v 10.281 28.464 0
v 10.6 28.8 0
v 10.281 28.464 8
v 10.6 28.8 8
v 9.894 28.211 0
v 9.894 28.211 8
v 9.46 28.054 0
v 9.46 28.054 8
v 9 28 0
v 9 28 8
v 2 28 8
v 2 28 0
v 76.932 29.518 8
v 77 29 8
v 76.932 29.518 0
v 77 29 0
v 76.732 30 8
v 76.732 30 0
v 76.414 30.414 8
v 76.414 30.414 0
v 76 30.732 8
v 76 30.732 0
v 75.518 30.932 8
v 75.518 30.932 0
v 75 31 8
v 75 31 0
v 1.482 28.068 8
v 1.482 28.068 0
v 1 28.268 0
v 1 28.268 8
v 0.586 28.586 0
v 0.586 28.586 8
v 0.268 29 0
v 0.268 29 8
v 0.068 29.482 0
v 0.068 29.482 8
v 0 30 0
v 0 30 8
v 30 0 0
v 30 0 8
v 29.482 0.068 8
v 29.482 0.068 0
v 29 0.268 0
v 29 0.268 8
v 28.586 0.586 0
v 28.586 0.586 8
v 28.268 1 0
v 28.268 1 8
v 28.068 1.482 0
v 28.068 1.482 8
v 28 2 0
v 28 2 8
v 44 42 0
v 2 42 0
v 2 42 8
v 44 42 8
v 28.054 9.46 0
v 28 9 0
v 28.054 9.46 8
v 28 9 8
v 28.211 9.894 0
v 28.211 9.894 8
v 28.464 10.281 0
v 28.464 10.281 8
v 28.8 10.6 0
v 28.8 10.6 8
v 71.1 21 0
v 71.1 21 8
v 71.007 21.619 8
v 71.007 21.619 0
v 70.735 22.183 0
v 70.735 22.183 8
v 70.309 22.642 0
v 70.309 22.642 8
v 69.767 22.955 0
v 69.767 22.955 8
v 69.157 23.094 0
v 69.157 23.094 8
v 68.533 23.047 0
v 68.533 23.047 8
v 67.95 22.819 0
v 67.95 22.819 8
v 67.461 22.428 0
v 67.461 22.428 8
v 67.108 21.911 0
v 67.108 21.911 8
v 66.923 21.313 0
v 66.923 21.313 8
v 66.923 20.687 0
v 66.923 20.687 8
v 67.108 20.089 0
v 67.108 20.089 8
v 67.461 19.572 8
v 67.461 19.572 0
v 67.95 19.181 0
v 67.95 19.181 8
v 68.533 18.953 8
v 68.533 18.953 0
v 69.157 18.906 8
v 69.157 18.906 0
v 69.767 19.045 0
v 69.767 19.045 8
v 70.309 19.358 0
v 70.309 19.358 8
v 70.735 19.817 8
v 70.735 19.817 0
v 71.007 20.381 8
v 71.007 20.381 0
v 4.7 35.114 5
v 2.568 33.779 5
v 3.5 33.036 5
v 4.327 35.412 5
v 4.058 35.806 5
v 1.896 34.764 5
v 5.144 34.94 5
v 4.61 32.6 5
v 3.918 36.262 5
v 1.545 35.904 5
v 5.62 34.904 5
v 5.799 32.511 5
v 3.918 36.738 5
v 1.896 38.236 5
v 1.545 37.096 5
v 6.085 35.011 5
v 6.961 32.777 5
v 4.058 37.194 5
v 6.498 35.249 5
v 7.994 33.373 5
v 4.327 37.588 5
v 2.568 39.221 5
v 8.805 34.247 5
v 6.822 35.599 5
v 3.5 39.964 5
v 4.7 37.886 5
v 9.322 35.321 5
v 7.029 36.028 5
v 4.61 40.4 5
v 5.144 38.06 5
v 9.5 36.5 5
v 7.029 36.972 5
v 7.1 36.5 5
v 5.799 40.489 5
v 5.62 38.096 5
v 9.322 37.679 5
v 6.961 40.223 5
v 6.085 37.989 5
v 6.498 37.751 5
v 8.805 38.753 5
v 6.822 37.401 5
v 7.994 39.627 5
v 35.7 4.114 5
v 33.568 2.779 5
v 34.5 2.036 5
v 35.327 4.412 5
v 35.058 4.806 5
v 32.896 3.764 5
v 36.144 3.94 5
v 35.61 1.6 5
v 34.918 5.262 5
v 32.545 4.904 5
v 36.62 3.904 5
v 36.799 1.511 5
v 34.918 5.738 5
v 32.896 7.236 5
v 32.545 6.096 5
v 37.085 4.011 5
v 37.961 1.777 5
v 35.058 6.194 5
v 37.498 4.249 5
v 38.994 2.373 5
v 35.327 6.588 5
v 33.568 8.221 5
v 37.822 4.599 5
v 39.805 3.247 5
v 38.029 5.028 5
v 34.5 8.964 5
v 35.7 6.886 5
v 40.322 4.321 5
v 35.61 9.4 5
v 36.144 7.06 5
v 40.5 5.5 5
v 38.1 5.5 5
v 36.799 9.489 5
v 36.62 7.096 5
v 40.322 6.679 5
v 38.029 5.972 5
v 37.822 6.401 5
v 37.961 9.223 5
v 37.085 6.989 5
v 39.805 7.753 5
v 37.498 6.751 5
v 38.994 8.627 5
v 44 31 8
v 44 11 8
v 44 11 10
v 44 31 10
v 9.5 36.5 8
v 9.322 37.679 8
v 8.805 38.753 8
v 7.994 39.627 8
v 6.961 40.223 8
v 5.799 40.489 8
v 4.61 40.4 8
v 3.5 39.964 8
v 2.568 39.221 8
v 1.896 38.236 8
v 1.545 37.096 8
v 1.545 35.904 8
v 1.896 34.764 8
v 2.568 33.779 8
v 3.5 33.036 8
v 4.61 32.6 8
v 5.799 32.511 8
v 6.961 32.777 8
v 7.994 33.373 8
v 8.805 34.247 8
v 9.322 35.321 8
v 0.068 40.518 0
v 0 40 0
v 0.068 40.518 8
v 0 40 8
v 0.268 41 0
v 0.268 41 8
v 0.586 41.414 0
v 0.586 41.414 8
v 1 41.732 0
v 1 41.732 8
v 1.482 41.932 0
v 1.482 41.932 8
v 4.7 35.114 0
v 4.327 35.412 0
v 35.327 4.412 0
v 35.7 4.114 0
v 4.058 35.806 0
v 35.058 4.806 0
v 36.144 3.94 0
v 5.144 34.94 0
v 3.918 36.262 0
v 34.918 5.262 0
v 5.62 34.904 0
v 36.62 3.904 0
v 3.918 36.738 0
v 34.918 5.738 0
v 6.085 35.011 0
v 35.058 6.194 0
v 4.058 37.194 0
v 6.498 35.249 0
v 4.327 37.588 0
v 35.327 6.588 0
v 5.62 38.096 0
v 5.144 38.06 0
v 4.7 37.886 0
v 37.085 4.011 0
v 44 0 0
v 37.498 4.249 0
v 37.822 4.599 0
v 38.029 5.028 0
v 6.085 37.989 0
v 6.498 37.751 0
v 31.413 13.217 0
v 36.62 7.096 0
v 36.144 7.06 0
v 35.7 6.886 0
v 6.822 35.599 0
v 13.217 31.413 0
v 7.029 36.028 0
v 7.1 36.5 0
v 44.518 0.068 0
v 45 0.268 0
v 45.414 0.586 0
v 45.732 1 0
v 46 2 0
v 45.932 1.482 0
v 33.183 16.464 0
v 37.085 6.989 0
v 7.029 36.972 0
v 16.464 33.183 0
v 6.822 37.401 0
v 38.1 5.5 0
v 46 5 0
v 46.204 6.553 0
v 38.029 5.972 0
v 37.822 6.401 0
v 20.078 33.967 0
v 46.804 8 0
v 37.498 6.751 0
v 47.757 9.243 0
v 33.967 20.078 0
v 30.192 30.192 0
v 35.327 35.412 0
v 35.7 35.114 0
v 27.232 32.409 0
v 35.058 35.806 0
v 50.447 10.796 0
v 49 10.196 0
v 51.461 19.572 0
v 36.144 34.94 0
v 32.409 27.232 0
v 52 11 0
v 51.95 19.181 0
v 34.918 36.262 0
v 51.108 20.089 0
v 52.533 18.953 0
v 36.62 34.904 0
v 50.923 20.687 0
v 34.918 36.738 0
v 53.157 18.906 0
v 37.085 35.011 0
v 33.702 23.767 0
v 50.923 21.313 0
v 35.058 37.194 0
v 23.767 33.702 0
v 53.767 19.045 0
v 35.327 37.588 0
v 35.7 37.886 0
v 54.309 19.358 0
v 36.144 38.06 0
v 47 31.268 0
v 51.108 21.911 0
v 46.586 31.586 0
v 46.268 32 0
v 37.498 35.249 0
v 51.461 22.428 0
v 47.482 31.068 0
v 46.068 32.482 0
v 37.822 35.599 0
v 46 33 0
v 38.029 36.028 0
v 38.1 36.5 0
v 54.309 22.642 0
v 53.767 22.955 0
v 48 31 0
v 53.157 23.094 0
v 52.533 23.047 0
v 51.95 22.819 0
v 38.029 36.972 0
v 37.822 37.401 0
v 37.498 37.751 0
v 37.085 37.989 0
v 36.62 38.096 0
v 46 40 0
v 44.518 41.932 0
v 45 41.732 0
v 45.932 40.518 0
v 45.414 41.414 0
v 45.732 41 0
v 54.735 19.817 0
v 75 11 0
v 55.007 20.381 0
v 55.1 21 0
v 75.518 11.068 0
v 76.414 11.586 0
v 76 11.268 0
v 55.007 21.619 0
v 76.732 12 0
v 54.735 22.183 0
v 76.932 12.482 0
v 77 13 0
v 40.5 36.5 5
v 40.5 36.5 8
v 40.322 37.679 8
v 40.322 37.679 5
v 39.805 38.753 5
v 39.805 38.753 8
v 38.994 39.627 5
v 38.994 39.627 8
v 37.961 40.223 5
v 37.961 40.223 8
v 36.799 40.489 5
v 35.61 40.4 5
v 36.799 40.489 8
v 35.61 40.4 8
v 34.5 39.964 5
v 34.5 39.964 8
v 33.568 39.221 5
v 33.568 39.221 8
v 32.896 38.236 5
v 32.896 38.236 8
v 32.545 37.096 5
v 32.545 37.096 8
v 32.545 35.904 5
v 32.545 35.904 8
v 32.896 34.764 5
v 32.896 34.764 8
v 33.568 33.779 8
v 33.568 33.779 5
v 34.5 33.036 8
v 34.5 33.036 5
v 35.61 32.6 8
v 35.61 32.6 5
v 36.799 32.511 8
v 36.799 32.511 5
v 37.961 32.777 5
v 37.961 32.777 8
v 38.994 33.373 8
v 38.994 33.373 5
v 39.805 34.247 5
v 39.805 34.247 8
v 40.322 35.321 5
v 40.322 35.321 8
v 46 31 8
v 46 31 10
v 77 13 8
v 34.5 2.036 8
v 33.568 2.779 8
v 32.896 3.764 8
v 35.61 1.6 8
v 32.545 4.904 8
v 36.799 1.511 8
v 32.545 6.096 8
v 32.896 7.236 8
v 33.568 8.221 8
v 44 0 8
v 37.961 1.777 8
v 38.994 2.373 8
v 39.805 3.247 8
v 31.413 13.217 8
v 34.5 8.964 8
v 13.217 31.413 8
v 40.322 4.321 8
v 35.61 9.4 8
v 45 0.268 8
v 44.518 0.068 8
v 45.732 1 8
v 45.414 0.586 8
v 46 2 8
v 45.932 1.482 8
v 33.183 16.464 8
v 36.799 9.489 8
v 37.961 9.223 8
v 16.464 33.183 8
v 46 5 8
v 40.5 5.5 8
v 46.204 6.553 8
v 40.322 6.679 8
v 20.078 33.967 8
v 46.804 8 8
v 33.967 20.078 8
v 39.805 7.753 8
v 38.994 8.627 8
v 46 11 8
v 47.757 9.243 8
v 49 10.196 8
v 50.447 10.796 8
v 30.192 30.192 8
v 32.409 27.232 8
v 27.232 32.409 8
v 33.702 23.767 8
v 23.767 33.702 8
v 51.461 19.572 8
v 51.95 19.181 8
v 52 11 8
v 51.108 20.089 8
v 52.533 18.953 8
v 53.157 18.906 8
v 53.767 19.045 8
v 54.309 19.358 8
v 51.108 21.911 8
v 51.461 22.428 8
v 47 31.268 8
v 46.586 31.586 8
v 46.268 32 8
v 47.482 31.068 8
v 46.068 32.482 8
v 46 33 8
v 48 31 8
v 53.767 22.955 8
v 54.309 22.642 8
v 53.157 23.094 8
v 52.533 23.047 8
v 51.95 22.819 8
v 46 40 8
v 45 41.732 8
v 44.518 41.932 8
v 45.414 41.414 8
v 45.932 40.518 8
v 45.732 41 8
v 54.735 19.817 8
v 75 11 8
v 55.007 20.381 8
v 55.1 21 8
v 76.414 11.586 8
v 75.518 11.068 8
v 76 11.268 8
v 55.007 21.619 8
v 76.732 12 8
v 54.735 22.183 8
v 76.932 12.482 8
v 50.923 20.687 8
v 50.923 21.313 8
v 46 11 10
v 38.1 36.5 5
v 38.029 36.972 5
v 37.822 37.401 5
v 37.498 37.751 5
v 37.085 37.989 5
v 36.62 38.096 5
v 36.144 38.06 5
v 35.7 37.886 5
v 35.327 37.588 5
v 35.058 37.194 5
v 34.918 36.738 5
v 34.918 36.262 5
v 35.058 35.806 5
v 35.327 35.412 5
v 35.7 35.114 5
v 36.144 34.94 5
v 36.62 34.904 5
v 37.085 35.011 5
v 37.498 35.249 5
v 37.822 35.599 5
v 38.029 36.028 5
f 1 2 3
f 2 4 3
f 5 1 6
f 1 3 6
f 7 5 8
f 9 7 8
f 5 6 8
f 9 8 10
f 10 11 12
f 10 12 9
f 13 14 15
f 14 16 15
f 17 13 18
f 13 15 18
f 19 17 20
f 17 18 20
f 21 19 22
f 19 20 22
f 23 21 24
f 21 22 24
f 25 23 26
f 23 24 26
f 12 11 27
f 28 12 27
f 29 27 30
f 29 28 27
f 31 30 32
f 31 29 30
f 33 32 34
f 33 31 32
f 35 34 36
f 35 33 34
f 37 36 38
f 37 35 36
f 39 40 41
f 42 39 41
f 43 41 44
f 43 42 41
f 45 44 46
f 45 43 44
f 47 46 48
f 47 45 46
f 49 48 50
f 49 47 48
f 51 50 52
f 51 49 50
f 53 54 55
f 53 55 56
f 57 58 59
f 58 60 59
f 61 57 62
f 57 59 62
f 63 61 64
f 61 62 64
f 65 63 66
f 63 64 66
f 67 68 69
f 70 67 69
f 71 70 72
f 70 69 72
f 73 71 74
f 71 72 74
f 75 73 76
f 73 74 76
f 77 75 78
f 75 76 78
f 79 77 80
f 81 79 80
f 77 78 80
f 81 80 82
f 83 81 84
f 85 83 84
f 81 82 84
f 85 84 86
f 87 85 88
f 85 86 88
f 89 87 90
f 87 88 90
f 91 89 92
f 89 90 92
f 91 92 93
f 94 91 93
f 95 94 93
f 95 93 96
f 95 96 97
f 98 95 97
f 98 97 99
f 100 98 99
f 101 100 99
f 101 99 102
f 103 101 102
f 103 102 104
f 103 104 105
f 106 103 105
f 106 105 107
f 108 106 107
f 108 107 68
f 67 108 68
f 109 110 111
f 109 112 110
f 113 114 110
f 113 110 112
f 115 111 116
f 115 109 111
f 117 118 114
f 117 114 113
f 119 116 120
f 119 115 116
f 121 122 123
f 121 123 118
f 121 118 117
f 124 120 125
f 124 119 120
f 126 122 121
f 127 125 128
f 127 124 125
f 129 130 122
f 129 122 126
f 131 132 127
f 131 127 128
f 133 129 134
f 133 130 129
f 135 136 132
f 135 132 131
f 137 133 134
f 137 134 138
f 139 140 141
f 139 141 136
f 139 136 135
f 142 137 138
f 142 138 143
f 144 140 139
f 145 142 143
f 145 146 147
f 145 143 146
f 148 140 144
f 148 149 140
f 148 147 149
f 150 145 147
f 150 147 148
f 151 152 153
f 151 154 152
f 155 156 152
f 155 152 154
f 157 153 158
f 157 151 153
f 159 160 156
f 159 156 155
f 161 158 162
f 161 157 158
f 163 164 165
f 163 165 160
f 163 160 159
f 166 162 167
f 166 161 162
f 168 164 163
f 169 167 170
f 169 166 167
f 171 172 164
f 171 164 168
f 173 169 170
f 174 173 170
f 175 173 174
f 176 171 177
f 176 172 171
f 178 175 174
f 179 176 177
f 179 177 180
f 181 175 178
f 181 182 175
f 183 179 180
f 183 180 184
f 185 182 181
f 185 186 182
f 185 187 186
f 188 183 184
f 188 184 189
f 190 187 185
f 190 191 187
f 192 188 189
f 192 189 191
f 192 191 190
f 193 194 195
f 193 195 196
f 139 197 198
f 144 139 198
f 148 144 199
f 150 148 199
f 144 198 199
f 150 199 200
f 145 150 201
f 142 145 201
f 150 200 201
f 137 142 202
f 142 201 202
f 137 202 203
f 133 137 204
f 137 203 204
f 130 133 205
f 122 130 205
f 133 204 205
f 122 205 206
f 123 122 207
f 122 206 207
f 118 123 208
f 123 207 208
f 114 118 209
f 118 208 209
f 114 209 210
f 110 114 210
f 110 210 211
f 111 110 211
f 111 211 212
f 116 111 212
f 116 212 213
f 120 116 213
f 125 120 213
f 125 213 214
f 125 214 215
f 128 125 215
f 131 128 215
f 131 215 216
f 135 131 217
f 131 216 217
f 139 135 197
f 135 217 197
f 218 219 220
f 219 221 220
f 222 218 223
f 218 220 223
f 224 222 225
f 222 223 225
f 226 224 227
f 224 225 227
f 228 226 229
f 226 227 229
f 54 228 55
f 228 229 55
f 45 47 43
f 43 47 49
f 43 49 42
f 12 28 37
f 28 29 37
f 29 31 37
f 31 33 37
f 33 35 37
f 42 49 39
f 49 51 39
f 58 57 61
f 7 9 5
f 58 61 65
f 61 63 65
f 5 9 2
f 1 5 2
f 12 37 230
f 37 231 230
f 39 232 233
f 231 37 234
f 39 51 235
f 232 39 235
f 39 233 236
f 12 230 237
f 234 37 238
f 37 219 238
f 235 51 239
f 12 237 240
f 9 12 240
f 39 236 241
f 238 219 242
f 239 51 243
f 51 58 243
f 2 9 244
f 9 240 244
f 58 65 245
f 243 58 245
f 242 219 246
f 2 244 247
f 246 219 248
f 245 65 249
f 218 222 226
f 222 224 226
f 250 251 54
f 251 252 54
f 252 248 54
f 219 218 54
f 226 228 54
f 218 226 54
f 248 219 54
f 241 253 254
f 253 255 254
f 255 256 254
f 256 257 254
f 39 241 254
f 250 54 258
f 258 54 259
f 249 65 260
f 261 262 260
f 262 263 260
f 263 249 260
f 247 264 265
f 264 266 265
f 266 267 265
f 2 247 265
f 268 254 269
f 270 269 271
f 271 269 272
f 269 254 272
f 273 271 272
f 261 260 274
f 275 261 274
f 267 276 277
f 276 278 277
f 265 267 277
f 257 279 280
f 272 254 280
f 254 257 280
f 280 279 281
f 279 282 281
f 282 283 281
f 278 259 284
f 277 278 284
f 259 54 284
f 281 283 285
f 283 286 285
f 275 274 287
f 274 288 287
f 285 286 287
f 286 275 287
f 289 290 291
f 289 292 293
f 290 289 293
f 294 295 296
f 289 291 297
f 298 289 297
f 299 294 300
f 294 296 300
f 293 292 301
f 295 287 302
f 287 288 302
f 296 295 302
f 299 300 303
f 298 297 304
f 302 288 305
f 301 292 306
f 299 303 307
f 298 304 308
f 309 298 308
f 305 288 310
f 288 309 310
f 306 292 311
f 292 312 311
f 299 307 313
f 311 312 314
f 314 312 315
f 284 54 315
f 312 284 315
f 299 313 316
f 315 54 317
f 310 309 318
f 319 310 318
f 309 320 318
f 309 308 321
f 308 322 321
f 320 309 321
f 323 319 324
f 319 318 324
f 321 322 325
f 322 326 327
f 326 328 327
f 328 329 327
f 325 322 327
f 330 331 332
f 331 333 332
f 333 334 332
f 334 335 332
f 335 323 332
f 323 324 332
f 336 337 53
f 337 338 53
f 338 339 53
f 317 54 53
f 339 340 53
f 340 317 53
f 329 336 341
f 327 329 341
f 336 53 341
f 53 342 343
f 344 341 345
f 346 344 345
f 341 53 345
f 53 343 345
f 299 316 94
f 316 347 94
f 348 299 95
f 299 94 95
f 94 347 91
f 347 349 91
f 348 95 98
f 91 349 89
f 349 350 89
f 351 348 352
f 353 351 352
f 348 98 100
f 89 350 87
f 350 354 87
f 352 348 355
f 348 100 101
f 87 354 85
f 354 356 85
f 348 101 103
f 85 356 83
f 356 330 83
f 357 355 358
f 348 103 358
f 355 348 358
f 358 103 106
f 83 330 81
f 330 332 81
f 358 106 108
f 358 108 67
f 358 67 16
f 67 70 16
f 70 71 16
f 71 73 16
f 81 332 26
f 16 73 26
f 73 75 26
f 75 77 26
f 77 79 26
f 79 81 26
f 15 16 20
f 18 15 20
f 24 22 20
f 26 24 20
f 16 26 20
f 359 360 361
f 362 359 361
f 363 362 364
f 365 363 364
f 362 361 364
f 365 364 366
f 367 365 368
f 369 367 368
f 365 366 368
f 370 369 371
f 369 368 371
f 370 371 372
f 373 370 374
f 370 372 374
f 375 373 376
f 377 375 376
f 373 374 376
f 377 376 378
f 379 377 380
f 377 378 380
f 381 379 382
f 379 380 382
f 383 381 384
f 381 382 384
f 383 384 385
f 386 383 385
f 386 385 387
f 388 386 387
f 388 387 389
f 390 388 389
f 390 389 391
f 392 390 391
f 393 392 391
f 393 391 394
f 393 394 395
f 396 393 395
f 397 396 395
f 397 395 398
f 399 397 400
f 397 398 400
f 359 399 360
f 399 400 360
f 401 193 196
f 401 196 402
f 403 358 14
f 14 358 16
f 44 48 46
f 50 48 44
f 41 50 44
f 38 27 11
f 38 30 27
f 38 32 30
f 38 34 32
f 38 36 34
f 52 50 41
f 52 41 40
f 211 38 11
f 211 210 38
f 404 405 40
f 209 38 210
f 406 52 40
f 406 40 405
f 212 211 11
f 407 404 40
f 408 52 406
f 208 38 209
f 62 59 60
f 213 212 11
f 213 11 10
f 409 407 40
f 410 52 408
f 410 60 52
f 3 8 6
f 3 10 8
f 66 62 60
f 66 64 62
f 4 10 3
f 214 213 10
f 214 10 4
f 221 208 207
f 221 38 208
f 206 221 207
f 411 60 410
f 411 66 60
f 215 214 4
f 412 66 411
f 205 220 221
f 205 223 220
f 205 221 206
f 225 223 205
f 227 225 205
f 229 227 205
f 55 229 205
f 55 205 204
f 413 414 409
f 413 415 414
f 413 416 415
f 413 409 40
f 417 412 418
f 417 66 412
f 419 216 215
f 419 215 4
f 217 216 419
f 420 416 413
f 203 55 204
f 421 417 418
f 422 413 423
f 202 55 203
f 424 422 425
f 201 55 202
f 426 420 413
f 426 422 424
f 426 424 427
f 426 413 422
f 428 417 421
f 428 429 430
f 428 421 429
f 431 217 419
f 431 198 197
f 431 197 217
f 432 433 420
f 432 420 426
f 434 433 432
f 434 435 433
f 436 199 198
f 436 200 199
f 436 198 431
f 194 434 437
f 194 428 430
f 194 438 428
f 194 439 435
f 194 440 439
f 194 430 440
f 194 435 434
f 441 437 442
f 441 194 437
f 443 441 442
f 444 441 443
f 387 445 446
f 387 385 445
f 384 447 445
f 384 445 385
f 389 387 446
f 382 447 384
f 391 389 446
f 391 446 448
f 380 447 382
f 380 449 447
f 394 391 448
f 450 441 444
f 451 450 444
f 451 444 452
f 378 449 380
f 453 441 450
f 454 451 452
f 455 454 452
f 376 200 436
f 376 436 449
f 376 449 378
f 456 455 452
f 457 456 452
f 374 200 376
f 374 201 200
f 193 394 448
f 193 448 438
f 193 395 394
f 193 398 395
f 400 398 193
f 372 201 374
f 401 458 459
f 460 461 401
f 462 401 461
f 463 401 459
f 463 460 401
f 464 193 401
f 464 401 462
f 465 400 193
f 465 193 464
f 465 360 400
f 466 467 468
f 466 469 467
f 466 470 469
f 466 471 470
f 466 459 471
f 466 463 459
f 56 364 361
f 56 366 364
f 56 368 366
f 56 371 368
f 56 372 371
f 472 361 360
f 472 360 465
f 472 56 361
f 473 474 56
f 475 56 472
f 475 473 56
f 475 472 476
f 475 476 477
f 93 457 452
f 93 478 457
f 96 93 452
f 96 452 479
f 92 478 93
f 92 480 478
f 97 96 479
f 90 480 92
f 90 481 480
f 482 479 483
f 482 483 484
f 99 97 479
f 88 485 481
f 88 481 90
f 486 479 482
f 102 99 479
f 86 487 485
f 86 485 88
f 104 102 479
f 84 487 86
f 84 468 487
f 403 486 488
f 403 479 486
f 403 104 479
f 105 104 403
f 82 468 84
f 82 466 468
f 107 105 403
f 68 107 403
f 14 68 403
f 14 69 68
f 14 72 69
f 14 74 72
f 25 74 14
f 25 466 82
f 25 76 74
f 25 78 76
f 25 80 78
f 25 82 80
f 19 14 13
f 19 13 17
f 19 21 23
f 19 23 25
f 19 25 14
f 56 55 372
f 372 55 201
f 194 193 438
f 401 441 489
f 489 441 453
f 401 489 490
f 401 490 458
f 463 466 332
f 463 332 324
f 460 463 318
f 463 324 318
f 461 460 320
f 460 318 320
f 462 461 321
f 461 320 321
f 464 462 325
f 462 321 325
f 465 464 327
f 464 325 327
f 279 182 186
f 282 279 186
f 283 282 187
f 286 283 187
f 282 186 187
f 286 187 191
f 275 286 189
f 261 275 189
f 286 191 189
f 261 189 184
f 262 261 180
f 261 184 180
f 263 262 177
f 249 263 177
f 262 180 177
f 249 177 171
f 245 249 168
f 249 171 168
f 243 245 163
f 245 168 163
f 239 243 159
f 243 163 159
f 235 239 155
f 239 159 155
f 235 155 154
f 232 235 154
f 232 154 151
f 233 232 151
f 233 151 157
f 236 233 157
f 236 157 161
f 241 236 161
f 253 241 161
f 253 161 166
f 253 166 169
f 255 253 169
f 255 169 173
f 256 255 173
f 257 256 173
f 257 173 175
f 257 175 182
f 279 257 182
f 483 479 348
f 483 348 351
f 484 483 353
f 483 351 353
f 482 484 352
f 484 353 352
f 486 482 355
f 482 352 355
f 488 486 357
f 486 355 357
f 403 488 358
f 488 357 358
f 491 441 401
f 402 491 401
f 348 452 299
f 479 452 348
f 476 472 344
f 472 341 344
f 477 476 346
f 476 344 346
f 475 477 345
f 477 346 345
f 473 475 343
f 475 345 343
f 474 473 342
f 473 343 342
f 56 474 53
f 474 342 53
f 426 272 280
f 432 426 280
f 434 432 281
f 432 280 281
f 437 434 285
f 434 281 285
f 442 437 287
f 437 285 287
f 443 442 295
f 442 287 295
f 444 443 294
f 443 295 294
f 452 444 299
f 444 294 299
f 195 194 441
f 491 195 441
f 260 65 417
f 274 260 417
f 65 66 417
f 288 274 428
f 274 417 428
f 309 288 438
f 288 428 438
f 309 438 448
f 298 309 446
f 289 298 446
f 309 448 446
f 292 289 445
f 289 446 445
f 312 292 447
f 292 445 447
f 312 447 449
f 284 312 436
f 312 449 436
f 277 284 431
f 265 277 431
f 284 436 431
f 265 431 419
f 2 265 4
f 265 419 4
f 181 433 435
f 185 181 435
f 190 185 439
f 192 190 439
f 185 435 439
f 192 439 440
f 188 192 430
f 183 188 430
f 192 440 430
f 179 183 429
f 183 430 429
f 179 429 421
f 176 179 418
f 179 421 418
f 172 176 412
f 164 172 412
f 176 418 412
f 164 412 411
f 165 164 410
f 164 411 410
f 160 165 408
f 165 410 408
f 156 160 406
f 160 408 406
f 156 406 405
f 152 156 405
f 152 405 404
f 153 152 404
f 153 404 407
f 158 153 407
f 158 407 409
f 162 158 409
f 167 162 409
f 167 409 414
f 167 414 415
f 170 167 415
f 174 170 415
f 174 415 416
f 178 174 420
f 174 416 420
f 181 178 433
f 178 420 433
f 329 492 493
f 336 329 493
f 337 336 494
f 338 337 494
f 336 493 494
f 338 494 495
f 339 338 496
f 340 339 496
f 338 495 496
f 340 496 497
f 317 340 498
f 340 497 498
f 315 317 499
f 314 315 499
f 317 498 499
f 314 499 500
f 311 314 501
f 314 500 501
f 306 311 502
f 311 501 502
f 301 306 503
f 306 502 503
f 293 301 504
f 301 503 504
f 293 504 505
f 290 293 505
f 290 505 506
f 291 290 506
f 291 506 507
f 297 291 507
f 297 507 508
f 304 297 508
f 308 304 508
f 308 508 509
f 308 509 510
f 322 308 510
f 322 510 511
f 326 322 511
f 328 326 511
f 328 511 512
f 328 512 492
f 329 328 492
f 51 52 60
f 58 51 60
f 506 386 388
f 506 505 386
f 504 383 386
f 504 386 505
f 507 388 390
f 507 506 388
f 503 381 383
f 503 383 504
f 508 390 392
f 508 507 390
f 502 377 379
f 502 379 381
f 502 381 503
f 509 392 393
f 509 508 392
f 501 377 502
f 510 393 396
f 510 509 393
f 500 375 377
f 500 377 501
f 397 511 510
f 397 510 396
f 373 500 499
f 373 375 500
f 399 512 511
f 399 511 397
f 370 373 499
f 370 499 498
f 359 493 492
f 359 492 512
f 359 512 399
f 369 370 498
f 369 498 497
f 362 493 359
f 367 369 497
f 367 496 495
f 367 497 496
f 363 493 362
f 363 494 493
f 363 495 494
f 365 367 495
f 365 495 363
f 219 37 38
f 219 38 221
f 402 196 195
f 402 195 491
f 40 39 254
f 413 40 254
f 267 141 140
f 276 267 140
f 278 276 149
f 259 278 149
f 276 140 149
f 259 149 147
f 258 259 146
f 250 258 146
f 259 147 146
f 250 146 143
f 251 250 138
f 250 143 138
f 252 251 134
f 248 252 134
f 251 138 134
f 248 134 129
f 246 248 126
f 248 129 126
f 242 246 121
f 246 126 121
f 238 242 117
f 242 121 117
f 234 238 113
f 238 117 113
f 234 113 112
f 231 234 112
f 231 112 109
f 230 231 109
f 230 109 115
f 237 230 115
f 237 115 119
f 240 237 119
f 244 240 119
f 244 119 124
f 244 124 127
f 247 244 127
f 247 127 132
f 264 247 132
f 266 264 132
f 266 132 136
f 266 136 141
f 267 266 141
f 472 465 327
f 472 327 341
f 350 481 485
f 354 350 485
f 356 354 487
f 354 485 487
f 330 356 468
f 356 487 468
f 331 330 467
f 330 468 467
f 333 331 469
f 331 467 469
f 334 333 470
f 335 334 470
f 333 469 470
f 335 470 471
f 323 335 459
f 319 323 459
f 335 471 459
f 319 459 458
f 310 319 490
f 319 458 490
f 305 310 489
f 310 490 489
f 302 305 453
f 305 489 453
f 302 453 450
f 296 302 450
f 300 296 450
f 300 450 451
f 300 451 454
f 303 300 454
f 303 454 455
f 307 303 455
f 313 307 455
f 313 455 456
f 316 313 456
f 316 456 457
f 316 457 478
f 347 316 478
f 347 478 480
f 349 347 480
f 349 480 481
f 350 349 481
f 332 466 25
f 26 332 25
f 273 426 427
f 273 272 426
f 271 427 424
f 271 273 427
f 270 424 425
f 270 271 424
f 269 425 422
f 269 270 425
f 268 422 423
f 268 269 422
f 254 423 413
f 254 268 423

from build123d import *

# Parameters (mm, degrees)
ESQUISSE1_W             = 77
ESQUISSE1_H             = 42
BOSS_EXTRU_1_DEPTH      = 8
ESQUISSE3_R             = 4
ENL_V_MAT_EXTRU_1_DEPTH = 3
ESQUISSE4_R             = 13
ENL_V_MAT_EXTRU_2_DEPTH = 9
ESQUISSE5_W             = 28
ESQUISSE5_H             = 28
ENL_V_MAT_EXTRU_3_DEPTH = 9
ESQUISSE10_R            = 1.6
ENL_V_MAT_EXTRU_4_DEPTH = 6
ESQUISSE11_W            = 31
ESQUISSE11_H            = 11
ENL_V_MAT_EXTRU_5_DEPTH = 9
ESQUISSE12_R            = 2.1
ENL_V_MAT_EXTRU_6_DEPTH = 9
CONG_1_R                = 6
CONG_2_R                = 2
SKETCH1_W               = 2
SKETCH1_H               = 20
BOSS_EXTRUDE1_DEPTH     = 2


with BuildPart() as part:
    # Esquisse1 → Boss.-Extru.1 (new body)
    with BuildSketch(Plane.XY):
        with Locations((38.5, 21)):
            Rectangle(ESQUISSE1_W, ESQUISSE1_H)
    extrude(amount=BOSS_EXTRU_1_DEPTH)

    # Esquisse3 → Enlèv. mat.-Extru.1 (cut)
    with BuildSketch(Plane.XY.offset(8)):
        with Locations((5.5, 36.5)):
            Circle(ESQUISSE3_R)
        with Locations((36.5, 36.5)):
            Circle(ESQUISSE3_R)
        with Locations((36.5, 5.5)):
            Circle(ESQUISSE3_R)
    extrude(amount=-ENL_V_MAT_EXTRU_1_DEPTH, mode=Mode.SUBTRACT)

    # Esquisse4 → Enlèv. mat.-Extru.2 (cut, through all)
    with BuildSketch(Plane.XY.offset(8)):
        with Locations((21, 21)):
            Circle(ESQUISSE4_R)
    extrude(amount=-ENL_V_MAT_EXTRU_2_DEPTH, mode=Mode.SUBTRACT)

    # Esquisse5 → Enlèv. mat.-Extru.3 (cut, through all)
    with BuildSketch(Plane.XY.offset(8)):
        with Locations((14, 14)):
            Rectangle(ESQUISSE5_W, ESQUISSE5_H)
    extrude(amount=-ENL_V_MAT_EXTRU_3_DEPTH, mode=Mode.SUBTRACT)

    # Esquisse10 → Enlèv. mat.-Extru.4 (cut, through all)
    with BuildSketch(Plane.XY.offset(5)):
        with Locations((5.5, 36.5)):
            Circle(ESQUISSE10_R)
        with Locations((36.5, 36.5)):
            Circle(ESQUISSE10_R)
        with Locations((36.5, 5.5)):
            Circle(ESQUISSE10_R)
    extrude(amount=-ENL_V_MAT_EXTRU_4_DEPTH, mode=Mode.SUBTRACT)

    # Esquisse11 → Enlèv. mat.-Extru.5 (cut, through all)
    with BuildSketch(Plane.XY.offset(8)):
        with Locations((61.5, 5.5)):
            Rectangle(ESQUISSE11_W, ESQUISSE11_H)
        with Locations((61.5, 36.5)):
            Rectangle(ESQUISSE11_W, ESQUISSE11_H)
    extrude(amount=-ENL_V_MAT_EXTRU_5_DEPTH, mode=Mode.SUBTRACT)

    # Esquisse12 → Enlèv. mat.-Extru.6 (cut, through all)
    with BuildSketch(Plane.XY.offset(8)):
        with Locations((53, 21)):
            Circle(ESQUISSE12_R)
        with Locations((69, 21)):
            Circle(ESQUISSE12_R)
    extrude(amount=-ENL_V_MAT_EXTRU_6_DEPTH, mode=Mode.SUBTRACT)

    # Congé1
    cong_1_edges = [part.edges().sort_by_distance(p)[0] for p in [
        (46, 11, 4),
    ]]
    fillet(cong_1_edges, radius=CONG_1_R)

    # Congé2
    cong_2_edges = [part.edges().sort_by_distance(p)[0] for p in [
        (28, 10.04554885, 4),
        (10.04554885, 28, 4),
        (0, 28, 4),
        (28, 0, 4),
        (77, 11, 4),
        (46, 0, 4),
        (0, 42, 4),
        (77, 31, 4),
        (46, 31, 4),
        (46, 42, 4),
    ]]
    fillet(cong_2_edges, radius=CONG_2_R)

    # Sketch1 → Boss-Extrude1 (add)
    with BuildSketch(Plane.XY.offset(8)):
        with Locations((45, 21)):
            Rectangle(SKETCH1_W, SKETCH1_H)
    extrude(amount=BOSS_EXTRUDE1_DEPTH)


solid = part.part
